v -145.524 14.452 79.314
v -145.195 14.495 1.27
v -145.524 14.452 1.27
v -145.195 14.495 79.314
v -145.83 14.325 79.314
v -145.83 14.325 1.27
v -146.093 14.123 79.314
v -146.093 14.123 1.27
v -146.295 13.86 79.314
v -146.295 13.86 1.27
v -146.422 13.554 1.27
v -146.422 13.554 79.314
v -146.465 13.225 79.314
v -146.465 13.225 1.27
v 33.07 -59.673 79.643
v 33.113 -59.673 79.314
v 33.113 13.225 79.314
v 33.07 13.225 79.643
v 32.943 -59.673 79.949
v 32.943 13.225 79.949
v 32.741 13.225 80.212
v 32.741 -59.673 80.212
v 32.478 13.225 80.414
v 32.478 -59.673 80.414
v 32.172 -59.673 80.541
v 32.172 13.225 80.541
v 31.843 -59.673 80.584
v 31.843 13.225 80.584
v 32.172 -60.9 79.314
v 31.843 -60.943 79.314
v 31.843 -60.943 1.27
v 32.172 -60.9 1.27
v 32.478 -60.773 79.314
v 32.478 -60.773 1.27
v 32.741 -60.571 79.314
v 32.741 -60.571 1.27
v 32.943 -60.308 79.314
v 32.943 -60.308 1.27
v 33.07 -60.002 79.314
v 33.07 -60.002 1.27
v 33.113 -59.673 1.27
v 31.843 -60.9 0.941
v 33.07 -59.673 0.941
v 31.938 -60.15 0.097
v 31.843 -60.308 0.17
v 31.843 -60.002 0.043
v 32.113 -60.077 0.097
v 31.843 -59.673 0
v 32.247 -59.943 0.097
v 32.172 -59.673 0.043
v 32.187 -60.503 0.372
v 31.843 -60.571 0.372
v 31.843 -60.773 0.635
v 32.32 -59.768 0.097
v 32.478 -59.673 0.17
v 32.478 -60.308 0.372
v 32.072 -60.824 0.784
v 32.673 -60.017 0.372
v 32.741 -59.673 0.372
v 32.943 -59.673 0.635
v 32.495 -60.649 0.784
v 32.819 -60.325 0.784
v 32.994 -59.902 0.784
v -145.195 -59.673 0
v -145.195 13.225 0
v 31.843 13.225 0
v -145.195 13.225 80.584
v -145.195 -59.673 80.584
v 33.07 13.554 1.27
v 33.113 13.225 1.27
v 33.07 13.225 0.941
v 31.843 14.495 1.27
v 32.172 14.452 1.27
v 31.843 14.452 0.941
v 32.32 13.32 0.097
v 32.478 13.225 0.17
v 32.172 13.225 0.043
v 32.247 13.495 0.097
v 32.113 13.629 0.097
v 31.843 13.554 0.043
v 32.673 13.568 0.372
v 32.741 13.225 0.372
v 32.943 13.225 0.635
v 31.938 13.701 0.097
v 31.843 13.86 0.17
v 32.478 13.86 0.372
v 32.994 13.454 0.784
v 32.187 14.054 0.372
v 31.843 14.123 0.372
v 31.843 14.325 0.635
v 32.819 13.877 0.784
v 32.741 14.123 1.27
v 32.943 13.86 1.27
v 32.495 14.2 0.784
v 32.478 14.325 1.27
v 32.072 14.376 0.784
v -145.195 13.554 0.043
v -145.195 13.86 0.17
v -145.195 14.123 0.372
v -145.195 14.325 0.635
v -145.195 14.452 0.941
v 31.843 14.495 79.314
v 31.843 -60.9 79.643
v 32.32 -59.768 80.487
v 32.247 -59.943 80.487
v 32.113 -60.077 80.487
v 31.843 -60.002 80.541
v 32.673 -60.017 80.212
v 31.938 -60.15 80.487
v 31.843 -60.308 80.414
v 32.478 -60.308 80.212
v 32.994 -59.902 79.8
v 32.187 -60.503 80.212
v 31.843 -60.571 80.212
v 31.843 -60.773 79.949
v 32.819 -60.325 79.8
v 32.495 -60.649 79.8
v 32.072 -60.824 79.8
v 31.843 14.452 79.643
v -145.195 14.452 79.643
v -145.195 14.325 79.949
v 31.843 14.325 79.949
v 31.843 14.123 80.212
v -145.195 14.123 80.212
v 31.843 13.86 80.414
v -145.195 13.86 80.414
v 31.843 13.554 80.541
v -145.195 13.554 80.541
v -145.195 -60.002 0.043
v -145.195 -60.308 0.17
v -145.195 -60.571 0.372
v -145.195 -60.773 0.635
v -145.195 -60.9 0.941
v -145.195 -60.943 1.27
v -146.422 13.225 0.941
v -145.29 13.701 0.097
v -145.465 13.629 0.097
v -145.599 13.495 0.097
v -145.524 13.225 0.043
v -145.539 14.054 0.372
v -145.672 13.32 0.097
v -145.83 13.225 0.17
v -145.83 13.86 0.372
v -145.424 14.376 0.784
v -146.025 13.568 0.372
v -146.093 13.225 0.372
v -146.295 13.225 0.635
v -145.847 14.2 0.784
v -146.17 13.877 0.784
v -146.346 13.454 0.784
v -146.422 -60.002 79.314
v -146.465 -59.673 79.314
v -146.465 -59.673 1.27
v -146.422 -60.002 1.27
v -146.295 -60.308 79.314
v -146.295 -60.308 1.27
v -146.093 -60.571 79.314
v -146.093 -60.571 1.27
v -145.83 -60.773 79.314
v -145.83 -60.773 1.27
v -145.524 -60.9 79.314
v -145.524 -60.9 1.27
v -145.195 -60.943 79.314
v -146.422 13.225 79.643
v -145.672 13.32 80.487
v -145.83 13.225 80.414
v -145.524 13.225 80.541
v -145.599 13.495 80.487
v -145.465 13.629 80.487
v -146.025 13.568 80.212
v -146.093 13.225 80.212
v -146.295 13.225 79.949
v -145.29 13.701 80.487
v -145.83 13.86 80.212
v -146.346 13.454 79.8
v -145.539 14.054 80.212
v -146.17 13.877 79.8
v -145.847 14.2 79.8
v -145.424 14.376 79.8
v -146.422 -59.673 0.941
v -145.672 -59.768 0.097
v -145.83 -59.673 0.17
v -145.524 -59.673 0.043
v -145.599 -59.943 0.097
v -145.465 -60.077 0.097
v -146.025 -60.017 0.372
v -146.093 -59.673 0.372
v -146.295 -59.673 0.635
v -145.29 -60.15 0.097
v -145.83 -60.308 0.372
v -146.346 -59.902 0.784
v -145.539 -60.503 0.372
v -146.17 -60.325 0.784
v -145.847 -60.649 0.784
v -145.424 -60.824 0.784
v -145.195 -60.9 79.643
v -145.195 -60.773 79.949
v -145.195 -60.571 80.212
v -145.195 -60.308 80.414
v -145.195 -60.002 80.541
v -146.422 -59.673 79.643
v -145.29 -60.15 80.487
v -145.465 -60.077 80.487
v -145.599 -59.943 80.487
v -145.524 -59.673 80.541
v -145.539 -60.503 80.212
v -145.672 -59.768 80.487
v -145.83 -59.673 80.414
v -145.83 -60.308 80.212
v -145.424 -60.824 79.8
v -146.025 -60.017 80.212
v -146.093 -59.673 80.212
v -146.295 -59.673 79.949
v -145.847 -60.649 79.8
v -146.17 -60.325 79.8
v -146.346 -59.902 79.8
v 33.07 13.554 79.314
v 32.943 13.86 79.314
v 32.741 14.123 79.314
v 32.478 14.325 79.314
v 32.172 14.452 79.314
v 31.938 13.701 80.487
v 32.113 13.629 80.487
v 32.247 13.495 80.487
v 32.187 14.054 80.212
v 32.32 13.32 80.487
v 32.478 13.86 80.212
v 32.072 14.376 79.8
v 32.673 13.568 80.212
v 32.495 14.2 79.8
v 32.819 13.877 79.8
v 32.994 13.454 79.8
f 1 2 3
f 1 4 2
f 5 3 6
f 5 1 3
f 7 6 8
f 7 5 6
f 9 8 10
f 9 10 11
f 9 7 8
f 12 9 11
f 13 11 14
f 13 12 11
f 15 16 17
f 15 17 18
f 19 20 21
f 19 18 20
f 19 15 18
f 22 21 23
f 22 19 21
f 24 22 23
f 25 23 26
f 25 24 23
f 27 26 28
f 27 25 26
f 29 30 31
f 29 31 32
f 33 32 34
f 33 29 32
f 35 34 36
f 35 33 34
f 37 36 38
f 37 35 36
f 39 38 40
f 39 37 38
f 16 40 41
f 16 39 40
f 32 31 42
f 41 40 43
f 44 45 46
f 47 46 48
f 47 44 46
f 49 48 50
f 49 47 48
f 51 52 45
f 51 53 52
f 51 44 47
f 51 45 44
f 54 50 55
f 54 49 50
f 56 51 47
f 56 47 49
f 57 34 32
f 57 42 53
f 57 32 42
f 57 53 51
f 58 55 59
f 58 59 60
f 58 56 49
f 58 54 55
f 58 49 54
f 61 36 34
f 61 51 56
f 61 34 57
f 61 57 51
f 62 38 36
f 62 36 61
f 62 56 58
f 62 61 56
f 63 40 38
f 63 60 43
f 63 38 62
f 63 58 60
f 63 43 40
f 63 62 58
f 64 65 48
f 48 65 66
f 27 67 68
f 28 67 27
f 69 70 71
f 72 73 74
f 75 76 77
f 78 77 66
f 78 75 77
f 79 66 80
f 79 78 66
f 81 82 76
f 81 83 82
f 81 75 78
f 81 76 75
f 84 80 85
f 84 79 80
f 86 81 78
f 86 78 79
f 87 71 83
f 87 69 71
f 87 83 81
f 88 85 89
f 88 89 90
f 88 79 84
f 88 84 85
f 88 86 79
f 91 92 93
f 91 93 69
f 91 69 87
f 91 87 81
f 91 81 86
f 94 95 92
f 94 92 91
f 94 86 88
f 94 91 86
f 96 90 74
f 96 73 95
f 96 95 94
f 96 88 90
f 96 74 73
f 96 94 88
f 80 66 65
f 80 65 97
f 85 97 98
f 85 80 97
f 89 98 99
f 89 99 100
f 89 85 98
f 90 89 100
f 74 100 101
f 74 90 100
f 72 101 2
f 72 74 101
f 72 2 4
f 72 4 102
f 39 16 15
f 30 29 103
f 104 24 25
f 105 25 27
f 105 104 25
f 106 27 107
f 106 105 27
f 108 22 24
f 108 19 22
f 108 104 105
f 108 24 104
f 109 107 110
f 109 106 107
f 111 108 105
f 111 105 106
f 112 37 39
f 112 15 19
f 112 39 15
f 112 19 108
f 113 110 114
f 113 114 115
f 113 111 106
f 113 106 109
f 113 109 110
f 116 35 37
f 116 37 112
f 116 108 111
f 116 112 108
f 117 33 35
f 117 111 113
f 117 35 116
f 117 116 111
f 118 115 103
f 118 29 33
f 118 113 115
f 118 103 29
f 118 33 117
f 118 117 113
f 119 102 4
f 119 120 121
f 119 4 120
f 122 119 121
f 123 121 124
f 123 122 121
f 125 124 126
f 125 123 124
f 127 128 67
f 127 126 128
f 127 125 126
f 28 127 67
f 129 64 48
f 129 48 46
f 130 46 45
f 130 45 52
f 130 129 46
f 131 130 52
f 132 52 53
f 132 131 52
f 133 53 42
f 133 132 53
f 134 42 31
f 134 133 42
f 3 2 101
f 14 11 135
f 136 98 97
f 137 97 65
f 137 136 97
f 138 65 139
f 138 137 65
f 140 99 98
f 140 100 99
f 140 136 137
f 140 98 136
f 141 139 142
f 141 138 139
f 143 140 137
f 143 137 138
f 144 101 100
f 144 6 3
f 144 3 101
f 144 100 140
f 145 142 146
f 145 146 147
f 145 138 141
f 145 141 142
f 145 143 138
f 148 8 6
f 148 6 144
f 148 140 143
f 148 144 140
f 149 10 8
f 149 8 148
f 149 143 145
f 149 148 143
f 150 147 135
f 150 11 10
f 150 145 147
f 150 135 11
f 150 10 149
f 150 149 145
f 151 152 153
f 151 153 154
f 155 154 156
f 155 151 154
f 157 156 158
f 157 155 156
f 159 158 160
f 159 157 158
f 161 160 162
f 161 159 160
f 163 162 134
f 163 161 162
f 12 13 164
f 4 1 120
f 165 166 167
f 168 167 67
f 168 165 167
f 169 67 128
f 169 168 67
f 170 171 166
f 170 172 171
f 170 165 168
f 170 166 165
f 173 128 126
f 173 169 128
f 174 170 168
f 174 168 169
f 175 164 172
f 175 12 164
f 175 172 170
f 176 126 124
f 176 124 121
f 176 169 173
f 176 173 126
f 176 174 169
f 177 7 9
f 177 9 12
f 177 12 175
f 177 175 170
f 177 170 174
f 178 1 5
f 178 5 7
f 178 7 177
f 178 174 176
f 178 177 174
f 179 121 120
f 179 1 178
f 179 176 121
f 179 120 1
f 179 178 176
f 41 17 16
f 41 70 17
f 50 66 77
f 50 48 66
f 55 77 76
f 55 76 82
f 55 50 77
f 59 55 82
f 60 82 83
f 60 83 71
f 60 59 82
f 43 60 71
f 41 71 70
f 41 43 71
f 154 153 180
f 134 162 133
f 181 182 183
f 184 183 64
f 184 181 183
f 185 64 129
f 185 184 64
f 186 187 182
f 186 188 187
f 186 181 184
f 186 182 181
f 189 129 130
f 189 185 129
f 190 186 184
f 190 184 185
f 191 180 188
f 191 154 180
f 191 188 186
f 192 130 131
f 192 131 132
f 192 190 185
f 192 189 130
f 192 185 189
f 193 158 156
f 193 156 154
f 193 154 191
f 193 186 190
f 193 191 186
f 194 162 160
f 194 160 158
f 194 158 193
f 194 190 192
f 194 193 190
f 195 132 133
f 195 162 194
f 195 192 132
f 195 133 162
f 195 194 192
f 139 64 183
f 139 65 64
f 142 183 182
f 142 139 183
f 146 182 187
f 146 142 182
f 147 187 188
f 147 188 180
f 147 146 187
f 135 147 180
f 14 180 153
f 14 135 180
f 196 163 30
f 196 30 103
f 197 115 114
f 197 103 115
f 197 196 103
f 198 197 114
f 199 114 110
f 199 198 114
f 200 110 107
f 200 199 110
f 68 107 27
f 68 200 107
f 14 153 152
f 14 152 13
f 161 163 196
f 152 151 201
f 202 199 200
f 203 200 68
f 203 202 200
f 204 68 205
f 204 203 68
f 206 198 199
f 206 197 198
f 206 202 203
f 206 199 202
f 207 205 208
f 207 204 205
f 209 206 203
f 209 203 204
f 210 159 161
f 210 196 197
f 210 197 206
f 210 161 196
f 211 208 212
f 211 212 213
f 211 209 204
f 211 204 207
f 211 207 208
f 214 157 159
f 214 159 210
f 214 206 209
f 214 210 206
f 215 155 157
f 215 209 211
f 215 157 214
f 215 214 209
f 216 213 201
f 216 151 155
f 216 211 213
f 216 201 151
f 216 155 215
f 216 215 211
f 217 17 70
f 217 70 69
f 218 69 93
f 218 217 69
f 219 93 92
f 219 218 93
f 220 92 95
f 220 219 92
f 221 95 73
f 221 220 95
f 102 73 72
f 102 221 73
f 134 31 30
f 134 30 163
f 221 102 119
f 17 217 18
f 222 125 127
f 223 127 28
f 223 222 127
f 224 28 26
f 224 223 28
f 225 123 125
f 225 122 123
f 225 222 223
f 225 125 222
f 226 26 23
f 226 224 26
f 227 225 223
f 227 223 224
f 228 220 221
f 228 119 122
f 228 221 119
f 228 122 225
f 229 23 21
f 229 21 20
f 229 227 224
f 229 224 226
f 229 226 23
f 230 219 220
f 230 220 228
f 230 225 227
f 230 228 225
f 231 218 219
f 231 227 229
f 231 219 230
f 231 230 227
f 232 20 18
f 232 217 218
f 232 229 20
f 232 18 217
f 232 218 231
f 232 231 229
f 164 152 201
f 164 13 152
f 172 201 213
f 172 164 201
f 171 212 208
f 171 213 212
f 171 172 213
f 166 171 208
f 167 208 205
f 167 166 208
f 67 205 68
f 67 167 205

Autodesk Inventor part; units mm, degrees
ref_plane "YZ Plane" through (0, 0, 0) normal (1, 0, 0) x (0, 1, 0)
ref_plane "XZ Plane" through (0, 0, 0) normal (0, 1, 0) x (-1, 0, 0)
ref_plane "XY Plane" through (0, 0, 0) normal (0, 0, 1) x (1, 0, 0)
sketch "Sketch1" plane through (0, 0, 0) normal (0, 0, 1) x (1, 0, 0)
  line L0 (-146.4649, 14.4948) -> (33.1131, 14.4948)
  line L1 (33.1131, 14.4948) -> (33.1131, -60.9432)
  line L2 (33.1131, -60.9432) -> (-146.4649, -60.9432)
  line L3 (-146.4649, -60.9432) -> (-146.4649, 14.4948)
  line L4 (30.5731, 14.7488) -> (-143.9249, 14.7488) projected
  line L5 (-143.9249, -61.1972) -> (30.5731, -61.1972) projected
  line L6 (-147.2269, 11.4468) -> (-147.2269, -57.8952) projected
  point P0 (0, 0)
  point P1 (-146.4649, -23.2242)
  point P2 (-147.2269, -23.2242)
  point P3 (-56.6759, 14.4948)
  point P4 (-56.6759, 14.7488)
  dimension "d0" = 179.578
  dimension "d1" = 75.438
extrude "Extrusion1" add sketch "Sketch1" along normal blind 80.5841
fillet "Fillet1" radius 1.27 12 edges at (-146.4649, 14.4948, 40.292) (33.1131, 14.4948, 40.292) (-56.6759, 14.4948, 0) (-56.6759, 14.4948, 80.5841) (33.1131, -60.9432, 40.292) (33.1131, -23.2242, 0) (33.1131, -23.2242, 80.5841) (-146.4649, -60.9432, 40.292) (-56.6759, -60.9432, 0) (-56.6759, -60.9432, 80.5841) (-146.4649, -23.2242, 0) (-146.4649, -23.2242, 80.5841)
properties part number "Electrical_Yuasa_Np18-12_Middle"
